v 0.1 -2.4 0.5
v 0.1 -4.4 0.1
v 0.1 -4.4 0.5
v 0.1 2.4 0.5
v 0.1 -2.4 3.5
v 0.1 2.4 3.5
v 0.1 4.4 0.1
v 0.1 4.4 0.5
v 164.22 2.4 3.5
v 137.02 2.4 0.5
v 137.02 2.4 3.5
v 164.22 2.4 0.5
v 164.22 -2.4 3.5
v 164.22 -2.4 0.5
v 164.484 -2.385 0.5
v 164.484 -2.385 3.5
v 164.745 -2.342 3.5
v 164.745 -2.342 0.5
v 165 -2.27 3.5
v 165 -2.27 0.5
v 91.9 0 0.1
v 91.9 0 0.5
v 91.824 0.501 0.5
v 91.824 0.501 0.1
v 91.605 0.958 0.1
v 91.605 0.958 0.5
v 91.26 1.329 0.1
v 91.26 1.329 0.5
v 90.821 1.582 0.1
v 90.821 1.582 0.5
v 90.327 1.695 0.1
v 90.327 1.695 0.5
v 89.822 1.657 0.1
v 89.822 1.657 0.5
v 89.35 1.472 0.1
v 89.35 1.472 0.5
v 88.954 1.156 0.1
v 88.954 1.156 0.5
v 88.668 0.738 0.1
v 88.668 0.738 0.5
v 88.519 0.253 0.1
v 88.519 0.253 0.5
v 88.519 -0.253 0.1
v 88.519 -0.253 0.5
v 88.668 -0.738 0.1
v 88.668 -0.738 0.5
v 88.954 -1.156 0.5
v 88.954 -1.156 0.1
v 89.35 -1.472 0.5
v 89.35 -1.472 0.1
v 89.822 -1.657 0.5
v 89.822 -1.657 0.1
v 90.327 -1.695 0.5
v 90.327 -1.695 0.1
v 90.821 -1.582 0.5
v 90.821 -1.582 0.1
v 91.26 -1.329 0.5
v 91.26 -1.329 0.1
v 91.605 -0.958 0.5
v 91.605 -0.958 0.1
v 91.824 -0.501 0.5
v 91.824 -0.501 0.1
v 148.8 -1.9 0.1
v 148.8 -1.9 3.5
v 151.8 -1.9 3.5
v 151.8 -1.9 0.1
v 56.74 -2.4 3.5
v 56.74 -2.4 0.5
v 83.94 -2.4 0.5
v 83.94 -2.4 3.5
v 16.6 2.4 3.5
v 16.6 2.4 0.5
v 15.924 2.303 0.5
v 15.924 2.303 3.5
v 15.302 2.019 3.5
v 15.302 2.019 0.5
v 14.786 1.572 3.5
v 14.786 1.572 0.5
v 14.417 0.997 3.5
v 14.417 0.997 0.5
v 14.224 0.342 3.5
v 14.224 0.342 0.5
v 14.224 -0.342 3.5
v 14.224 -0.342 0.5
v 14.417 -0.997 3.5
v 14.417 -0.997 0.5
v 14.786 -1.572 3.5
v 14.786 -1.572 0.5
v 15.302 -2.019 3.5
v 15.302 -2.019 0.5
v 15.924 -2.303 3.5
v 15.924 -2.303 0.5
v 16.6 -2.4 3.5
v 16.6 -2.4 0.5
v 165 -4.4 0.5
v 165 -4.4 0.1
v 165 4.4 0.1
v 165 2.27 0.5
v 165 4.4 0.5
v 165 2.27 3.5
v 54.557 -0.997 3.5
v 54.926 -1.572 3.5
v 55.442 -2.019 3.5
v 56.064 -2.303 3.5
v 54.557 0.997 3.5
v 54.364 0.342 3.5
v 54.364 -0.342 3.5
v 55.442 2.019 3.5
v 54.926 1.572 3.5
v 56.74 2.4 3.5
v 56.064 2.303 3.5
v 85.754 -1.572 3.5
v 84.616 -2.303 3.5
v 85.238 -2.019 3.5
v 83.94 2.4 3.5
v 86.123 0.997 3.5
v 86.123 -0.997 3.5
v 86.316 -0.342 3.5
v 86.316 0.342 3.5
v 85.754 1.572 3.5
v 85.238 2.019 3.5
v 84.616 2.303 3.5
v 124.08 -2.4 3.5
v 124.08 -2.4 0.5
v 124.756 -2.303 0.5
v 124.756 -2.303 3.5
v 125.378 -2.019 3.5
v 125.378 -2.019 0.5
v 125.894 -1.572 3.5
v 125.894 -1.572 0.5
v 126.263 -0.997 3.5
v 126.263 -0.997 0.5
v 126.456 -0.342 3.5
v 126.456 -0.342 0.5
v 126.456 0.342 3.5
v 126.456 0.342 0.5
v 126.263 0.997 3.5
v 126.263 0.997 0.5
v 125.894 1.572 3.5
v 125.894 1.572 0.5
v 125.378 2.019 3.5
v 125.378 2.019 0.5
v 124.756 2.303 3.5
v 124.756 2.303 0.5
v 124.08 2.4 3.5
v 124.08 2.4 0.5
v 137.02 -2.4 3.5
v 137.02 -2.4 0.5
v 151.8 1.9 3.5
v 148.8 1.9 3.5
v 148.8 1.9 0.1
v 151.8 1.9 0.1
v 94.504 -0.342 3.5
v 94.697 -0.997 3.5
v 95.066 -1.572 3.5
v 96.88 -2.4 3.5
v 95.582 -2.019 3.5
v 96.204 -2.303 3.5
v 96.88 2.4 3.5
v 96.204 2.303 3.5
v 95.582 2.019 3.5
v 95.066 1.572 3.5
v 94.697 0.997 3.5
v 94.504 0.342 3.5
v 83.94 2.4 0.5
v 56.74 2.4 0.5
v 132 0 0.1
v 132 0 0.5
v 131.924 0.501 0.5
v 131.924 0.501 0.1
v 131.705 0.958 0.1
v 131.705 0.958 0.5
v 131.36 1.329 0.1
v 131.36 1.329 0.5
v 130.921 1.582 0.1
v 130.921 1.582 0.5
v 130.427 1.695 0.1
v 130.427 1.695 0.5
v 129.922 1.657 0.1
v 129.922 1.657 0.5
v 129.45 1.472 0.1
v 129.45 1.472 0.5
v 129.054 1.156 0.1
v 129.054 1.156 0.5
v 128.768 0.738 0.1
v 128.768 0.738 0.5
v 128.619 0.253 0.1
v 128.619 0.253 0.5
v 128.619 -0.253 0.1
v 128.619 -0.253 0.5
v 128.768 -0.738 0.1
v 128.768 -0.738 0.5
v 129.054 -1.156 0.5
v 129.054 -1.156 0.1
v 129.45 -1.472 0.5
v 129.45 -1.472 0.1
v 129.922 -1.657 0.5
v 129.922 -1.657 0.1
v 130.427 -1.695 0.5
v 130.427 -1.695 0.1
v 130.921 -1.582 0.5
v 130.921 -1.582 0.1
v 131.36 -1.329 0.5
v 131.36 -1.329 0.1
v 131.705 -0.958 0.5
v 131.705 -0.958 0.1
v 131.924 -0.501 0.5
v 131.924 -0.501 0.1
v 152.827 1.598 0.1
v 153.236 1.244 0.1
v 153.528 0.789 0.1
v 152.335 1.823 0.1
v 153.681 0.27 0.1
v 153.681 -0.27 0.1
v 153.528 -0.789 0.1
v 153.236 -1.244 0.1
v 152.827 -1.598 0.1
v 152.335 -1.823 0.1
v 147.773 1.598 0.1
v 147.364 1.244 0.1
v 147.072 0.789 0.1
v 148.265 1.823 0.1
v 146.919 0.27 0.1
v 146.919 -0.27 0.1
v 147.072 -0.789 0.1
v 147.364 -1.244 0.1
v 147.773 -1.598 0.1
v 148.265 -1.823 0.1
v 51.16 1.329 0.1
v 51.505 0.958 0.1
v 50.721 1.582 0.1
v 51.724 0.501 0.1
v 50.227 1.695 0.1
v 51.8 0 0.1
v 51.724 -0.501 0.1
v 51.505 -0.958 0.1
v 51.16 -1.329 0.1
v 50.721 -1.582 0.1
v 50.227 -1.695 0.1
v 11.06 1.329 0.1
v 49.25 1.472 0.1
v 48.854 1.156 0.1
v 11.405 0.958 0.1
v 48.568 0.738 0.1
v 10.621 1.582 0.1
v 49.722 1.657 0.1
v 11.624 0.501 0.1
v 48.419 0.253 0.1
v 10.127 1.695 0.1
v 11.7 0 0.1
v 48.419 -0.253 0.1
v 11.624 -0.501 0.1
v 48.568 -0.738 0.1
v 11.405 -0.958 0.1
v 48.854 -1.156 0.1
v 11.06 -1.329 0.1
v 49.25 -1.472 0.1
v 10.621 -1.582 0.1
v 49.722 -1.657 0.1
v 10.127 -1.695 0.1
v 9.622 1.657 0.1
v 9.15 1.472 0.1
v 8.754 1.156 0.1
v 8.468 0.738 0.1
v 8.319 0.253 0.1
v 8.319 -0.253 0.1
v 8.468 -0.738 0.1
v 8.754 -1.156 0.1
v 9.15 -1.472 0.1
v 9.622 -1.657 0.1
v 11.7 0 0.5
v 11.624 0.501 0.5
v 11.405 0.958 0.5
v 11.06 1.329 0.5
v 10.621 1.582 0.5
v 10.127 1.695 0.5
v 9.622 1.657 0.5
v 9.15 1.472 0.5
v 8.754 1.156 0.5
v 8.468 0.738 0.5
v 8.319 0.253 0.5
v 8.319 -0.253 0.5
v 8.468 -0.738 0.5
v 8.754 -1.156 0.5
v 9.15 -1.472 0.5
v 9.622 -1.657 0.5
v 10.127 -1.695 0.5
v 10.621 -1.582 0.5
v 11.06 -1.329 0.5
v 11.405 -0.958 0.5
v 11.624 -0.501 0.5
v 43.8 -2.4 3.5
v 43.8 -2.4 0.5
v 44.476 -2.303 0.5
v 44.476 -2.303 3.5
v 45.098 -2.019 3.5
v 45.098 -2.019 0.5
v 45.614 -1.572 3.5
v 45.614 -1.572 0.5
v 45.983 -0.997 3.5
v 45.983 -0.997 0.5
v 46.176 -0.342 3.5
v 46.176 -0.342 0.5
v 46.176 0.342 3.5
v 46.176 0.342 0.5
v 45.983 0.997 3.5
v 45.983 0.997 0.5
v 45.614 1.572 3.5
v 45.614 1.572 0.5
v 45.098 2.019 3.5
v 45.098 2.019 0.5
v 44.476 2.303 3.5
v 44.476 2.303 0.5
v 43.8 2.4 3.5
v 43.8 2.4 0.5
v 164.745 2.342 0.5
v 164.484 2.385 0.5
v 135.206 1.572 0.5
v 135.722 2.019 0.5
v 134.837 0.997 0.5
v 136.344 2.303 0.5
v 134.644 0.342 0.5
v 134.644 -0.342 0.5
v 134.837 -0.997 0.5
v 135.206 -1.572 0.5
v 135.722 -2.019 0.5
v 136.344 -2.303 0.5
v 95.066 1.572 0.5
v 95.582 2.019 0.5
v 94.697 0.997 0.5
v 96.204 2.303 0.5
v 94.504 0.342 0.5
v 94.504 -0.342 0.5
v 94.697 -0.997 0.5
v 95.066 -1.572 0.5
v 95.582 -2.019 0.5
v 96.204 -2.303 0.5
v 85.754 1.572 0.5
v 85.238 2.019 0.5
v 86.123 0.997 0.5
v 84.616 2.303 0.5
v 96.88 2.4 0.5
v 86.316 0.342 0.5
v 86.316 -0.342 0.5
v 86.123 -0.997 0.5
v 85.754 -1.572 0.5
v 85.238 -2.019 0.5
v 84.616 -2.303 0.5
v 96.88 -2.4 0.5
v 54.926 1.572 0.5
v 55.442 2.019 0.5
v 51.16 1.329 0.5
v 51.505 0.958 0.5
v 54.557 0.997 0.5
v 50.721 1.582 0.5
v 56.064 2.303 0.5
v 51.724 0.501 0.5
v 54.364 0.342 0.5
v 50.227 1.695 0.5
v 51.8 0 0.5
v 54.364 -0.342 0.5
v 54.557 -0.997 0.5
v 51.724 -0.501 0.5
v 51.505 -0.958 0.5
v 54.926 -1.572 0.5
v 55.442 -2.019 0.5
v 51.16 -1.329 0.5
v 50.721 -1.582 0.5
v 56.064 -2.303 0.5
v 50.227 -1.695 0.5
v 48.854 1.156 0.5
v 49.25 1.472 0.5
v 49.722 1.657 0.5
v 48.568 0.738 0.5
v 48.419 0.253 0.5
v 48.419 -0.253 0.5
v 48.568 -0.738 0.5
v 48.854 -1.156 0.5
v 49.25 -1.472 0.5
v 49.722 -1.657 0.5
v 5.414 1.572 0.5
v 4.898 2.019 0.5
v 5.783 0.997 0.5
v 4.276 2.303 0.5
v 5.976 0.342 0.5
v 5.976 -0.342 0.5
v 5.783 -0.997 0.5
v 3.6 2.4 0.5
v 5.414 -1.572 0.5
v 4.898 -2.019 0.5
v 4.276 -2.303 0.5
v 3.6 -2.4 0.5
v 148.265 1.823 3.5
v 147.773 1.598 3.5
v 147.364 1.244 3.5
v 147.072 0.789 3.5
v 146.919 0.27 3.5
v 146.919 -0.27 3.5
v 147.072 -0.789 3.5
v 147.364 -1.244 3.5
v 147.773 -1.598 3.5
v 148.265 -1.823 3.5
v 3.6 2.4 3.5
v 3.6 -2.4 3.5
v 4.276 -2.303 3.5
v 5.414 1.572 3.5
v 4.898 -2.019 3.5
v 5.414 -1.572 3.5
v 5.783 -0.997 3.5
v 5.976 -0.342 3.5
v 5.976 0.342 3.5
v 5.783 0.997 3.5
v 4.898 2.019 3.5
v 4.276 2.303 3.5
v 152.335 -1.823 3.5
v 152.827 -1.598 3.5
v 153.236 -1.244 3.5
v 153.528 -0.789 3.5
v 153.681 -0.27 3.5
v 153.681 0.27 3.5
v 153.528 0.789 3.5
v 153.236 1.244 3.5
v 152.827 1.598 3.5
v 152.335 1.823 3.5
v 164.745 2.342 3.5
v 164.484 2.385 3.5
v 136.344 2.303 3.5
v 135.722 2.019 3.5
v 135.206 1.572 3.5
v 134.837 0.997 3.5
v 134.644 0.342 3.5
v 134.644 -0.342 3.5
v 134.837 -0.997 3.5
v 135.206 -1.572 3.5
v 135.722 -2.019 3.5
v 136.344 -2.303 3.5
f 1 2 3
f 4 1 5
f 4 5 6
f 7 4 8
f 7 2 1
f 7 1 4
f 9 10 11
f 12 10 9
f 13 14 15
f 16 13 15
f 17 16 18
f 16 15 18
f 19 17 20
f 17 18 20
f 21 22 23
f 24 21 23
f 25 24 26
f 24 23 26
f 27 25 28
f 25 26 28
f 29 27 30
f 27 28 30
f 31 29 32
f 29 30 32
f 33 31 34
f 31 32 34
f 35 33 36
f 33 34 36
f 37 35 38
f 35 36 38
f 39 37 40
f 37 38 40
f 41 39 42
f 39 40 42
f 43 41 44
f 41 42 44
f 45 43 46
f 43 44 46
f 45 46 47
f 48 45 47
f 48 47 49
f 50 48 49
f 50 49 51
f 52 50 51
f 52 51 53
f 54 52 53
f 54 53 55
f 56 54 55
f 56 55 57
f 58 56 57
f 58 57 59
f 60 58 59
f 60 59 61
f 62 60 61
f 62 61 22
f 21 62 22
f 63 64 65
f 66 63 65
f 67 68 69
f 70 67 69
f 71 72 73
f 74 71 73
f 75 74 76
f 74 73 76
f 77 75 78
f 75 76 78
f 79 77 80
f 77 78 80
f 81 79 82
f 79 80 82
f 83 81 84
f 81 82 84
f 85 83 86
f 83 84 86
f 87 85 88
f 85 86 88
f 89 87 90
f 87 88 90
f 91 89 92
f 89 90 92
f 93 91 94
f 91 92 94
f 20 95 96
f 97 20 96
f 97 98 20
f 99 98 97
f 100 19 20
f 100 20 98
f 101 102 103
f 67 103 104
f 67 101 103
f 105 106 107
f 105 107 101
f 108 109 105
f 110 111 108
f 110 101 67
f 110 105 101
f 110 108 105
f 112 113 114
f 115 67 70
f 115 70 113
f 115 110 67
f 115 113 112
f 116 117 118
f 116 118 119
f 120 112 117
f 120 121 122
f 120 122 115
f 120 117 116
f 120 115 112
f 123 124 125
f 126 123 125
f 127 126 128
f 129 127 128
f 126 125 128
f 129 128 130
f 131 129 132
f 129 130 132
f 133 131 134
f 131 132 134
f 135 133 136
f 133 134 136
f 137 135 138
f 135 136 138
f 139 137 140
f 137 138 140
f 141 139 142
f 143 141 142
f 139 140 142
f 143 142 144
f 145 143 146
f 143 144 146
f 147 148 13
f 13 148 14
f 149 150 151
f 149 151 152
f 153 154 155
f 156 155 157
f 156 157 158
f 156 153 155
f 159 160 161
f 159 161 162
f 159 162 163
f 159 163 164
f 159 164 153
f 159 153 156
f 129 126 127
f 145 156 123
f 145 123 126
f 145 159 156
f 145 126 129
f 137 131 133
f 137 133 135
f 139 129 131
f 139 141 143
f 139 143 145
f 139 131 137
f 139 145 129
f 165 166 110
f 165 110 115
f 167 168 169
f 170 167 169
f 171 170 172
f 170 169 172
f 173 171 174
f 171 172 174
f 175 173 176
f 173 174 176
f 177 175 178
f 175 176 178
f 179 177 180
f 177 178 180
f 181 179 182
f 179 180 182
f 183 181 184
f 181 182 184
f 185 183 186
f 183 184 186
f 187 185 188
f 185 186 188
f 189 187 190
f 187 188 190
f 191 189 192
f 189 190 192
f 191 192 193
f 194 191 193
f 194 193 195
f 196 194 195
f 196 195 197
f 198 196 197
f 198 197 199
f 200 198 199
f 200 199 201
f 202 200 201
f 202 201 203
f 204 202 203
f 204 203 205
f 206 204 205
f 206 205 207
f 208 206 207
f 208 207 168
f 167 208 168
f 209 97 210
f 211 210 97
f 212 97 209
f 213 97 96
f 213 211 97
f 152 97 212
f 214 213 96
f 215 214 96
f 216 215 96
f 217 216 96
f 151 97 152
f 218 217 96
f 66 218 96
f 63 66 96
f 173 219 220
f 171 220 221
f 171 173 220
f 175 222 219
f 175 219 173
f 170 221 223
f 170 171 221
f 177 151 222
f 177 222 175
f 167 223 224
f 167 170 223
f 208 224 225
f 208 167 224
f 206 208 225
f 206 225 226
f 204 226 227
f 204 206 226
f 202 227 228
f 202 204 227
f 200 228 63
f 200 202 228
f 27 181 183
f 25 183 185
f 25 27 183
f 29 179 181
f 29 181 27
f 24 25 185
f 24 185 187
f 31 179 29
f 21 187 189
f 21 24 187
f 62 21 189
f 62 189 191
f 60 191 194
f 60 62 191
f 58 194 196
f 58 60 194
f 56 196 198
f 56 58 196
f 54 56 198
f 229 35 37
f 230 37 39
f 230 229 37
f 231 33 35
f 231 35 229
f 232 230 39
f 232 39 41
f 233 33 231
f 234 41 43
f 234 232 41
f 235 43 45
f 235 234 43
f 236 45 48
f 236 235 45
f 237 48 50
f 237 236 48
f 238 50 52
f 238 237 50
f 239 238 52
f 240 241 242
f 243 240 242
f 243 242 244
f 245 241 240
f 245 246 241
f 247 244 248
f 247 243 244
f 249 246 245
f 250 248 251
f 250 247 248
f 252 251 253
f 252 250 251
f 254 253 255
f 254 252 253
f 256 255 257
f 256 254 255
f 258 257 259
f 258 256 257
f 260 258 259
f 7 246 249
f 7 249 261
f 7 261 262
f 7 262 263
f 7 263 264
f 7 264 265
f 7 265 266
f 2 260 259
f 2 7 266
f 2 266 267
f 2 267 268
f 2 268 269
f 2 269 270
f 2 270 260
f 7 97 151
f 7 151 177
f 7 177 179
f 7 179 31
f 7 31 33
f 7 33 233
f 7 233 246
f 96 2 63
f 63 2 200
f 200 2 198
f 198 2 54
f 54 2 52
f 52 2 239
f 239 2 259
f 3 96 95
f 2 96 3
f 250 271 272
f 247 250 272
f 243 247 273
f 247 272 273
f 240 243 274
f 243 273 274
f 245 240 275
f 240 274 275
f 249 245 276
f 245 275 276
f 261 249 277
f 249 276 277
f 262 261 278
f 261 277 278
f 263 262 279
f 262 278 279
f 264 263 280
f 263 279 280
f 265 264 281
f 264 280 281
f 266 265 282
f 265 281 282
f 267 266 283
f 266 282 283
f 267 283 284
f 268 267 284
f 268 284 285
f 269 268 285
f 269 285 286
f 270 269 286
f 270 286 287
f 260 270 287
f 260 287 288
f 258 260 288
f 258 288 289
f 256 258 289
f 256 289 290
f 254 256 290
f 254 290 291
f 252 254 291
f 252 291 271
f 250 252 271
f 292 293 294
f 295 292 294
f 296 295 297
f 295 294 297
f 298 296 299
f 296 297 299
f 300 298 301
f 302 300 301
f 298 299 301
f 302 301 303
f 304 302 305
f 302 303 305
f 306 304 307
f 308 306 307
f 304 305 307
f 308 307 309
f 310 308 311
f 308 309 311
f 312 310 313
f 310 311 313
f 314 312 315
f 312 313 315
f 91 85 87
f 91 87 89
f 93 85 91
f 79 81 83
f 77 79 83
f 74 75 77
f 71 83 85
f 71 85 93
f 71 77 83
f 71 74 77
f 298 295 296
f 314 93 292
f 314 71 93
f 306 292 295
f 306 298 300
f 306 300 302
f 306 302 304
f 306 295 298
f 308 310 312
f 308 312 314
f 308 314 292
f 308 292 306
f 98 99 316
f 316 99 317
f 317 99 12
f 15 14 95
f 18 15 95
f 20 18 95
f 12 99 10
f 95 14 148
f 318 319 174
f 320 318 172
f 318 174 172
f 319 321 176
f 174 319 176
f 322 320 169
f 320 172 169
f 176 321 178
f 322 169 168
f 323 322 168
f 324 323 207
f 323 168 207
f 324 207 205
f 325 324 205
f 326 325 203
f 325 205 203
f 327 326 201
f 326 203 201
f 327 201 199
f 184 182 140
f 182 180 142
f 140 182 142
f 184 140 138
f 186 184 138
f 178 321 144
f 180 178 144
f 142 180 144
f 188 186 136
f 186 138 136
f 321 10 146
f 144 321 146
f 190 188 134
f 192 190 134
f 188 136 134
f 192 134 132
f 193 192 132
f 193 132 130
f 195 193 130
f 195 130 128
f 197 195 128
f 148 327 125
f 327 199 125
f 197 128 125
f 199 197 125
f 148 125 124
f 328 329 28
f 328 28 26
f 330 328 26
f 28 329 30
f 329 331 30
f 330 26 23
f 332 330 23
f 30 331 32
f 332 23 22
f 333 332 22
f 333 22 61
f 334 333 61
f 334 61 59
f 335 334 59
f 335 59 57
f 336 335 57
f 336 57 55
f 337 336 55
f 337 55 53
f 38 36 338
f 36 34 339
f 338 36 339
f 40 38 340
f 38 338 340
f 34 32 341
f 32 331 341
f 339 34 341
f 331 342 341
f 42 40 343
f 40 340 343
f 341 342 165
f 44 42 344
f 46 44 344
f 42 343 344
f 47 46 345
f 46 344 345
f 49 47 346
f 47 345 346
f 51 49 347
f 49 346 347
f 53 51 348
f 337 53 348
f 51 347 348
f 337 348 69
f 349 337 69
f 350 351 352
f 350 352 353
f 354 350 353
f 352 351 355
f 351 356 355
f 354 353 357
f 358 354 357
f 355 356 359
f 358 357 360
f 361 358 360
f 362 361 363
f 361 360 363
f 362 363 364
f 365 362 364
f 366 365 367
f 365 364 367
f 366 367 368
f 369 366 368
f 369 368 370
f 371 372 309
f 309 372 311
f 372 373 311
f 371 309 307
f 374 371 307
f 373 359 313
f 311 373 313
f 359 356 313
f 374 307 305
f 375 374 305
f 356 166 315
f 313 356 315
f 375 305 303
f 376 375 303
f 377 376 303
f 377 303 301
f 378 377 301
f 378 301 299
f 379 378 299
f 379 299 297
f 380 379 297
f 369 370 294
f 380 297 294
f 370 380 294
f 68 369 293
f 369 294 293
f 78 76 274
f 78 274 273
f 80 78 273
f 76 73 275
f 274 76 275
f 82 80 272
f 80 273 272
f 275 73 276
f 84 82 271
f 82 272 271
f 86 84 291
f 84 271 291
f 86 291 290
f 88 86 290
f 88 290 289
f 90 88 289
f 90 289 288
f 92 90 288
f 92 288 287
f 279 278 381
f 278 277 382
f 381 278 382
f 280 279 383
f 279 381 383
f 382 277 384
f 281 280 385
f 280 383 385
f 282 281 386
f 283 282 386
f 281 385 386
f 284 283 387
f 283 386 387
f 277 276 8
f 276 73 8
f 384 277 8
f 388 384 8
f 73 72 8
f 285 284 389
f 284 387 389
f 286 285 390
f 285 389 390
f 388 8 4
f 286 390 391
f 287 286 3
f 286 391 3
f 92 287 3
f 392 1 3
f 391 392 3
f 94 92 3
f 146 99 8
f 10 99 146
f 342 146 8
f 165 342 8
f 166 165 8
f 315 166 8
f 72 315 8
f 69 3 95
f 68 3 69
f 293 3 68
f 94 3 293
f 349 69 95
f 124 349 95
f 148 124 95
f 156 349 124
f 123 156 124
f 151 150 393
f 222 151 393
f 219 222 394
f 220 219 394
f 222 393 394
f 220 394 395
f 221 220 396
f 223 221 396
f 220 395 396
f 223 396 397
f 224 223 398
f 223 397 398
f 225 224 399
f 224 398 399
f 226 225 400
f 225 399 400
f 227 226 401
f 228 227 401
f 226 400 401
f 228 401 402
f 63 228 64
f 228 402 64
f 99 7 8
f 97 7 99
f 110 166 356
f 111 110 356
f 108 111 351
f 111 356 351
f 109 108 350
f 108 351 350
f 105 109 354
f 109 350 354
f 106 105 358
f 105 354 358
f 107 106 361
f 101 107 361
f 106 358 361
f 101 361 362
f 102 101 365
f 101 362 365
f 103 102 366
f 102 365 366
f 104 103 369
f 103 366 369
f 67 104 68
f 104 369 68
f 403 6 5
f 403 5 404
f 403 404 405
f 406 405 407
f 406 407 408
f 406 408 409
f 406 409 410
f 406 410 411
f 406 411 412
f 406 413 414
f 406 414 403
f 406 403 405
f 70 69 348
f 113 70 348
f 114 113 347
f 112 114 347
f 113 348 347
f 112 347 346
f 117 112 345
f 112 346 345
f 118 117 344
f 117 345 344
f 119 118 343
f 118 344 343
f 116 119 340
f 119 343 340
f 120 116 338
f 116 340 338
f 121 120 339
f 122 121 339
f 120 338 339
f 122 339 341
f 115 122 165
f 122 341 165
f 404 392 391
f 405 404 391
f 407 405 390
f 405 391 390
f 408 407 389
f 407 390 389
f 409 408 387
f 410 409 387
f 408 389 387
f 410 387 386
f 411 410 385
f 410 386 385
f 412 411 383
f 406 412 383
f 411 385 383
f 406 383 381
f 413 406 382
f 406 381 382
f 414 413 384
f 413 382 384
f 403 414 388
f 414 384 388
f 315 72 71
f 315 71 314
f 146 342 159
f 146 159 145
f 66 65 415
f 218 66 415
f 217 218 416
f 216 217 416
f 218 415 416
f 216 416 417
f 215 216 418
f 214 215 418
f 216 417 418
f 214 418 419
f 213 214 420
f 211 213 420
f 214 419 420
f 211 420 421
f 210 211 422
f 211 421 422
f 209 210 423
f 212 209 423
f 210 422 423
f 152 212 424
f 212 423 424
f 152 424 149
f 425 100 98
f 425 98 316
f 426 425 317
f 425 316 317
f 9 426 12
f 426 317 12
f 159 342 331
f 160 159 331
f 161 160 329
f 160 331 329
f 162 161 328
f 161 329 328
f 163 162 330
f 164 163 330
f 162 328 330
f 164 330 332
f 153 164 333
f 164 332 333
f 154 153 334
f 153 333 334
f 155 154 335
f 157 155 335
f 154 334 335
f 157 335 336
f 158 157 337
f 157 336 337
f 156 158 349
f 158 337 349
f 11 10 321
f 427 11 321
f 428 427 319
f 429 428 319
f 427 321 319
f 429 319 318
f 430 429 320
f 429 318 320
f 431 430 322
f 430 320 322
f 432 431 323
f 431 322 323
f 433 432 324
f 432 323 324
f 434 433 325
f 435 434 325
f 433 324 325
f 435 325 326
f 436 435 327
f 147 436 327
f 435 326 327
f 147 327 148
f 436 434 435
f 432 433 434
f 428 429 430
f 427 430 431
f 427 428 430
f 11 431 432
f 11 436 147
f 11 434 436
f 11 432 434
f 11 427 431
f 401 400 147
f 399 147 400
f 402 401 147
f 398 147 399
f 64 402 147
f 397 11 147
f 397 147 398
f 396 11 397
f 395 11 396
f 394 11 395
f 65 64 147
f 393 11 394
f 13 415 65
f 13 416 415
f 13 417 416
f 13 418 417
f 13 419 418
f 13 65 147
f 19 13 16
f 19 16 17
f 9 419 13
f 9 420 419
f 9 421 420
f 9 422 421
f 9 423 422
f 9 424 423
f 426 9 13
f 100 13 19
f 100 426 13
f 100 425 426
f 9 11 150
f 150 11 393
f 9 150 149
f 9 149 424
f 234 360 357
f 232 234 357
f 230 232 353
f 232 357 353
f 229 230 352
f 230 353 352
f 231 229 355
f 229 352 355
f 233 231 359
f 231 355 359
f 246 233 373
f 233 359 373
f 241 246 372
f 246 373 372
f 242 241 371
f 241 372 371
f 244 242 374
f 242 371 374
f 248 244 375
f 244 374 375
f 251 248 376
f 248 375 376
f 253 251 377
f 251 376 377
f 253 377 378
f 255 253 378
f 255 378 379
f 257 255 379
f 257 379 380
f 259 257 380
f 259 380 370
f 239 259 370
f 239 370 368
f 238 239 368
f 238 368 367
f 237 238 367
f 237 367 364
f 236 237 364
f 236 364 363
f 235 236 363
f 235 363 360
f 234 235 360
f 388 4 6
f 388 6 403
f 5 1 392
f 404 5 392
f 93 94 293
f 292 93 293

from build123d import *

# Parameters (mm, degrees)
SKETCH_W          = 20
SKETCH_H          = 9
PAD_DEPTH         = 0.5
PAD001_DEPTH      = 3
PAD001_FACE6_W    = 9
PAD001_FACE6_H    = 0.5
PAD002_DEPTH      = 160
PAD003_DEPTH      = 3
SKETCH003_R       = 1.7
POCKET_DEPTH      = 5
SKETCH004_W       = 9
SKETCH004_H       = 3.5
POCKET001_DEPTH   = 10
SKETCH005_W       = 9
SKETCH005_H       = 3.5
POCKET002_DEPTH   = 5
POCKET002_FACE2_W = 9
POCKET002_FACE2_H = 165
POCKET002_FACE2_R = 1.7
POCKET003_DEPTH   = 0.1
POCKET004_DEPTH   = 0.1
SKETCH006_R       = 1.9
POCKET005_DEPTH   = 5
POCKET005_FACE6_W = 164.9
POCKET005_FACE6_H = 0.4
POCKET006_DEPTH   = 0.1
POCKET006_FACE1_W = 164.9
POCKET006_FACE1_H = 0.4
POCKET007_DEPTH   = 0.1
POCKET008_DEPTH   = 5


with BuildPart() as part:
    # Sketch → Pad (new body)
    with BuildSketch(Plane.XY):
        Rectangle(SKETCH_W, SKETCH_H)
    extrude(amount=PAD_DEPTH)

    # Sketch001 (on Face6 of Pad) → Pad001 (join)
    with BuildSketch(Plane.XY.offset(0.5)):
        with BuildLine():
            ThreePointArc((-3.6, 2.4), (-6, 0), (-3.6, -2.4))
            Line((-3.6, -2.4), (3.6, -2.4))
            ThreePointArc((3.6, -2.4), (6, 0), (3.6, 2.4))
            Line((-3.6, 2.4), (3.6, 2.4))
        make_face()
    extrude(amount=PAD001_DEPTH)

    # Pad001 Face6 → Pad002 (add)
    with BuildSketch(Plane(origin=(10, 0, 0.25), x_dir=(0, -1, 0), z_dir=(1, 0, 0))):
        Rectangle(PAD001_FACE6_W, PAD001_FACE6_H)
    extrude(amount=PAD002_DEPTH)

    # Sketch002 (on Face6 of Pad002) → Pad003 (join)
    with BuildSketch(Plane.XY.offset(0.5)):
        with BuildLine():
            ThreePointArc((16.6, 2.4), (14.2, 0), (16.6, -2.4))
            Line((16.6, -2.4), (43.8, -2.4))
            ThreePointArc((43.8, -2.4), (46.2, 0), (43.8, 2.4))
            Line((16.6, 2.4), (43.8, 2.4))
        make_face()
        with BuildLine():
            ThreePointArc((56.74, 2.4), (54.34, 0), (56.74, -2.4))
            Line((56.74, -2.4), (83.94, -2.4))
            ThreePointArc((83.94, -2.4), (86.34, 0), (83.94, 2.4))
            Line((56.74, 2.4), (83.94, 2.4))
        make_face()
        with BuildLine():
            ThreePointArc((96.88, 2.4), (94.48, 0), (96.88, -2.4))
            Line((96.88, -2.4), (124.08, -2.4))
            ThreePointArc((124.08, -2.4), (126.48, 0), (124.08, 2.4))
            Line((96.88, 2.4), (124.08, 2.4))
        make_face()
        with BuildLine():
            ThreePointArc((137.02, 2.4), (134.62, 0), (137.02, -2.4))
            Line((137.02, -2.4), (164.22, -2.4))
            ThreePointArc((164.22, -2.4), (166.62, 0), (164.22, 2.4))
            Line((137.02, 2.4), (164.22, 2.4))
        make_face()
    extrude(amount=PAD003_DEPTH)

    # Sketch003 (on Face5 of Pad003) → Pocket (cut)
    with BuildSketch(Plane.XY.offset(0.5)):
        with Locations((10, 0)):
            Circle(SKETCH003_R)
        with Locations((50.1, 0)):
            Circle(SKETCH003_R)
        with Locations((90.2, 0)):
            Circle(SKETCH003_R)
        with Locations((130.3, 0)):
            Circle(SKETCH003_R)
    extrude(amount=-POCKET_DEPTH, mode=Mode.SUBTRACT)

    # Sketch004 (on Face1 of Pocket) → Pocket001 (cut)
    with BuildSketch(Plane(origin=(-10, 0, 0), x_dir=(0, -1, 0), z_dir=(-1, 0, 0))):
        with Locations((0, 1.75)):
            Rectangle(SKETCH004_W, SKETCH004_H)
    extrude(amount=-POCKET001_DEPTH, mode=Mode.SUBTRACT)

    # Sketch005 (on Face3 of Pocket001) → Pocket002 (cut)
    with BuildSketch(Plane.YZ.offset(170)):
        with Locations((0, 1.75)):
            Rectangle(SKETCH005_W, SKETCH005_H)
    extrude(amount=-POCKET002_DEPTH, mode=Mode.SUBTRACT)

    # Pocket002 Face2 → Pocket003 (cut)
    with BuildSketch(Plane(origin=(82.8096, 0, 0), x_dir=(0, -1, 0), z_dir=(0, 0, -1))):
        with Locations((0, 0.3096)):
            Rectangle(POCKET002_FACE2_W, POCKET002_FACE2_H)
        with Locations((0, -47.4904)):
            Circle(POCKET002_FACE2_R, mode=Mode.SUBTRACT)
        with Locations((0, -7.3904)):
            Circle(POCKET002_FACE2_R, mode=Mode.SUBTRACT)
        with Locations((0, 32.7096)):
            Circle(POCKET002_FACE2_R, mode=Mode.SUBTRACT)
        with Locations((0, 72.8096)):
            Circle(POCKET002_FACE2_R, mode=Mode.SUBTRACT)
    extrude(amount=-POCKET003_DEPTH, mode=Mode.SUBTRACT)

    # Pocket003 Face5 → Pocket004 (cut)
    with BuildSketch(Plane(origin=(0, 0, 1.66), x_dir=(0, 1, 0), z_dir=(-1, 0, 0))):
        Polygon((4.5, 1.56), (-4.5, 1.56), (-4.5, 1.16), (-2.4, 1.16), (-2.4, -1.84), (2.4, -1.84), (2.4, 1.16), (4.5, 1.16), align=None)
    extrude(amount=-POCKET004_DEPTH, mode=Mode.SUBTRACT)

    # Sketch006 (on Face12 of Pocket004) → Pocket005 (cut)
    with BuildSketch(Plane.XY.offset(3.5)):
        with Locations((150.3, 0)):
            Circle(SKETCH006_R)
    extrude(amount=-POCKET005_DEPTH, mode=Mode.SUBTRACT)

    # Pocket005 Face6 → Pocket006 (cut)
    with BuildSketch(Plane(origin=(82.55, -4.5, 0.3), x_dir=(-1, 0, 0), z_dir=(0, -1, 0))):
        Rectangle(POCKET005_FACE6_W, POCKET005_FACE6_H)
    extrude(amount=-POCKET006_DEPTH, mode=Mode.SUBTRACT)

    # Pocket006 Face1 → Pocket007 (cut)
    with BuildSketch(Plane(origin=(82.55, 4.5, 0.3), x_dir=(1, 0, 0), z_dir=(0, 1, 0))):
        Rectangle(POCKET006_FACE1_W, POCKET006_FACE1_H)
    extrude(amount=-POCKET007_DEPTH, mode=Mode.SUBTRACT)

    # Sketch007 (on Face16 of Pocket007) → Pocket008 (cut)
    with BuildSketch(Plane.XY.offset(3.5)):
        with BuildLine():
            ThreePointArc((148.8, 1.9), (146.9, 0), (148.8, -1.9))
            Line((148.8, -1.9), (151.8, -1.9))
            ThreePointArc((151.8, -1.9), (153.7, 0), (151.8, 1.9))
            Line((148.8, 1.9), (151.8, 1.9))
        make_face()
    extrude(amount=-POCKET008_DEPTH, mode=Mode.SUBTRACT)


solid = part.part
